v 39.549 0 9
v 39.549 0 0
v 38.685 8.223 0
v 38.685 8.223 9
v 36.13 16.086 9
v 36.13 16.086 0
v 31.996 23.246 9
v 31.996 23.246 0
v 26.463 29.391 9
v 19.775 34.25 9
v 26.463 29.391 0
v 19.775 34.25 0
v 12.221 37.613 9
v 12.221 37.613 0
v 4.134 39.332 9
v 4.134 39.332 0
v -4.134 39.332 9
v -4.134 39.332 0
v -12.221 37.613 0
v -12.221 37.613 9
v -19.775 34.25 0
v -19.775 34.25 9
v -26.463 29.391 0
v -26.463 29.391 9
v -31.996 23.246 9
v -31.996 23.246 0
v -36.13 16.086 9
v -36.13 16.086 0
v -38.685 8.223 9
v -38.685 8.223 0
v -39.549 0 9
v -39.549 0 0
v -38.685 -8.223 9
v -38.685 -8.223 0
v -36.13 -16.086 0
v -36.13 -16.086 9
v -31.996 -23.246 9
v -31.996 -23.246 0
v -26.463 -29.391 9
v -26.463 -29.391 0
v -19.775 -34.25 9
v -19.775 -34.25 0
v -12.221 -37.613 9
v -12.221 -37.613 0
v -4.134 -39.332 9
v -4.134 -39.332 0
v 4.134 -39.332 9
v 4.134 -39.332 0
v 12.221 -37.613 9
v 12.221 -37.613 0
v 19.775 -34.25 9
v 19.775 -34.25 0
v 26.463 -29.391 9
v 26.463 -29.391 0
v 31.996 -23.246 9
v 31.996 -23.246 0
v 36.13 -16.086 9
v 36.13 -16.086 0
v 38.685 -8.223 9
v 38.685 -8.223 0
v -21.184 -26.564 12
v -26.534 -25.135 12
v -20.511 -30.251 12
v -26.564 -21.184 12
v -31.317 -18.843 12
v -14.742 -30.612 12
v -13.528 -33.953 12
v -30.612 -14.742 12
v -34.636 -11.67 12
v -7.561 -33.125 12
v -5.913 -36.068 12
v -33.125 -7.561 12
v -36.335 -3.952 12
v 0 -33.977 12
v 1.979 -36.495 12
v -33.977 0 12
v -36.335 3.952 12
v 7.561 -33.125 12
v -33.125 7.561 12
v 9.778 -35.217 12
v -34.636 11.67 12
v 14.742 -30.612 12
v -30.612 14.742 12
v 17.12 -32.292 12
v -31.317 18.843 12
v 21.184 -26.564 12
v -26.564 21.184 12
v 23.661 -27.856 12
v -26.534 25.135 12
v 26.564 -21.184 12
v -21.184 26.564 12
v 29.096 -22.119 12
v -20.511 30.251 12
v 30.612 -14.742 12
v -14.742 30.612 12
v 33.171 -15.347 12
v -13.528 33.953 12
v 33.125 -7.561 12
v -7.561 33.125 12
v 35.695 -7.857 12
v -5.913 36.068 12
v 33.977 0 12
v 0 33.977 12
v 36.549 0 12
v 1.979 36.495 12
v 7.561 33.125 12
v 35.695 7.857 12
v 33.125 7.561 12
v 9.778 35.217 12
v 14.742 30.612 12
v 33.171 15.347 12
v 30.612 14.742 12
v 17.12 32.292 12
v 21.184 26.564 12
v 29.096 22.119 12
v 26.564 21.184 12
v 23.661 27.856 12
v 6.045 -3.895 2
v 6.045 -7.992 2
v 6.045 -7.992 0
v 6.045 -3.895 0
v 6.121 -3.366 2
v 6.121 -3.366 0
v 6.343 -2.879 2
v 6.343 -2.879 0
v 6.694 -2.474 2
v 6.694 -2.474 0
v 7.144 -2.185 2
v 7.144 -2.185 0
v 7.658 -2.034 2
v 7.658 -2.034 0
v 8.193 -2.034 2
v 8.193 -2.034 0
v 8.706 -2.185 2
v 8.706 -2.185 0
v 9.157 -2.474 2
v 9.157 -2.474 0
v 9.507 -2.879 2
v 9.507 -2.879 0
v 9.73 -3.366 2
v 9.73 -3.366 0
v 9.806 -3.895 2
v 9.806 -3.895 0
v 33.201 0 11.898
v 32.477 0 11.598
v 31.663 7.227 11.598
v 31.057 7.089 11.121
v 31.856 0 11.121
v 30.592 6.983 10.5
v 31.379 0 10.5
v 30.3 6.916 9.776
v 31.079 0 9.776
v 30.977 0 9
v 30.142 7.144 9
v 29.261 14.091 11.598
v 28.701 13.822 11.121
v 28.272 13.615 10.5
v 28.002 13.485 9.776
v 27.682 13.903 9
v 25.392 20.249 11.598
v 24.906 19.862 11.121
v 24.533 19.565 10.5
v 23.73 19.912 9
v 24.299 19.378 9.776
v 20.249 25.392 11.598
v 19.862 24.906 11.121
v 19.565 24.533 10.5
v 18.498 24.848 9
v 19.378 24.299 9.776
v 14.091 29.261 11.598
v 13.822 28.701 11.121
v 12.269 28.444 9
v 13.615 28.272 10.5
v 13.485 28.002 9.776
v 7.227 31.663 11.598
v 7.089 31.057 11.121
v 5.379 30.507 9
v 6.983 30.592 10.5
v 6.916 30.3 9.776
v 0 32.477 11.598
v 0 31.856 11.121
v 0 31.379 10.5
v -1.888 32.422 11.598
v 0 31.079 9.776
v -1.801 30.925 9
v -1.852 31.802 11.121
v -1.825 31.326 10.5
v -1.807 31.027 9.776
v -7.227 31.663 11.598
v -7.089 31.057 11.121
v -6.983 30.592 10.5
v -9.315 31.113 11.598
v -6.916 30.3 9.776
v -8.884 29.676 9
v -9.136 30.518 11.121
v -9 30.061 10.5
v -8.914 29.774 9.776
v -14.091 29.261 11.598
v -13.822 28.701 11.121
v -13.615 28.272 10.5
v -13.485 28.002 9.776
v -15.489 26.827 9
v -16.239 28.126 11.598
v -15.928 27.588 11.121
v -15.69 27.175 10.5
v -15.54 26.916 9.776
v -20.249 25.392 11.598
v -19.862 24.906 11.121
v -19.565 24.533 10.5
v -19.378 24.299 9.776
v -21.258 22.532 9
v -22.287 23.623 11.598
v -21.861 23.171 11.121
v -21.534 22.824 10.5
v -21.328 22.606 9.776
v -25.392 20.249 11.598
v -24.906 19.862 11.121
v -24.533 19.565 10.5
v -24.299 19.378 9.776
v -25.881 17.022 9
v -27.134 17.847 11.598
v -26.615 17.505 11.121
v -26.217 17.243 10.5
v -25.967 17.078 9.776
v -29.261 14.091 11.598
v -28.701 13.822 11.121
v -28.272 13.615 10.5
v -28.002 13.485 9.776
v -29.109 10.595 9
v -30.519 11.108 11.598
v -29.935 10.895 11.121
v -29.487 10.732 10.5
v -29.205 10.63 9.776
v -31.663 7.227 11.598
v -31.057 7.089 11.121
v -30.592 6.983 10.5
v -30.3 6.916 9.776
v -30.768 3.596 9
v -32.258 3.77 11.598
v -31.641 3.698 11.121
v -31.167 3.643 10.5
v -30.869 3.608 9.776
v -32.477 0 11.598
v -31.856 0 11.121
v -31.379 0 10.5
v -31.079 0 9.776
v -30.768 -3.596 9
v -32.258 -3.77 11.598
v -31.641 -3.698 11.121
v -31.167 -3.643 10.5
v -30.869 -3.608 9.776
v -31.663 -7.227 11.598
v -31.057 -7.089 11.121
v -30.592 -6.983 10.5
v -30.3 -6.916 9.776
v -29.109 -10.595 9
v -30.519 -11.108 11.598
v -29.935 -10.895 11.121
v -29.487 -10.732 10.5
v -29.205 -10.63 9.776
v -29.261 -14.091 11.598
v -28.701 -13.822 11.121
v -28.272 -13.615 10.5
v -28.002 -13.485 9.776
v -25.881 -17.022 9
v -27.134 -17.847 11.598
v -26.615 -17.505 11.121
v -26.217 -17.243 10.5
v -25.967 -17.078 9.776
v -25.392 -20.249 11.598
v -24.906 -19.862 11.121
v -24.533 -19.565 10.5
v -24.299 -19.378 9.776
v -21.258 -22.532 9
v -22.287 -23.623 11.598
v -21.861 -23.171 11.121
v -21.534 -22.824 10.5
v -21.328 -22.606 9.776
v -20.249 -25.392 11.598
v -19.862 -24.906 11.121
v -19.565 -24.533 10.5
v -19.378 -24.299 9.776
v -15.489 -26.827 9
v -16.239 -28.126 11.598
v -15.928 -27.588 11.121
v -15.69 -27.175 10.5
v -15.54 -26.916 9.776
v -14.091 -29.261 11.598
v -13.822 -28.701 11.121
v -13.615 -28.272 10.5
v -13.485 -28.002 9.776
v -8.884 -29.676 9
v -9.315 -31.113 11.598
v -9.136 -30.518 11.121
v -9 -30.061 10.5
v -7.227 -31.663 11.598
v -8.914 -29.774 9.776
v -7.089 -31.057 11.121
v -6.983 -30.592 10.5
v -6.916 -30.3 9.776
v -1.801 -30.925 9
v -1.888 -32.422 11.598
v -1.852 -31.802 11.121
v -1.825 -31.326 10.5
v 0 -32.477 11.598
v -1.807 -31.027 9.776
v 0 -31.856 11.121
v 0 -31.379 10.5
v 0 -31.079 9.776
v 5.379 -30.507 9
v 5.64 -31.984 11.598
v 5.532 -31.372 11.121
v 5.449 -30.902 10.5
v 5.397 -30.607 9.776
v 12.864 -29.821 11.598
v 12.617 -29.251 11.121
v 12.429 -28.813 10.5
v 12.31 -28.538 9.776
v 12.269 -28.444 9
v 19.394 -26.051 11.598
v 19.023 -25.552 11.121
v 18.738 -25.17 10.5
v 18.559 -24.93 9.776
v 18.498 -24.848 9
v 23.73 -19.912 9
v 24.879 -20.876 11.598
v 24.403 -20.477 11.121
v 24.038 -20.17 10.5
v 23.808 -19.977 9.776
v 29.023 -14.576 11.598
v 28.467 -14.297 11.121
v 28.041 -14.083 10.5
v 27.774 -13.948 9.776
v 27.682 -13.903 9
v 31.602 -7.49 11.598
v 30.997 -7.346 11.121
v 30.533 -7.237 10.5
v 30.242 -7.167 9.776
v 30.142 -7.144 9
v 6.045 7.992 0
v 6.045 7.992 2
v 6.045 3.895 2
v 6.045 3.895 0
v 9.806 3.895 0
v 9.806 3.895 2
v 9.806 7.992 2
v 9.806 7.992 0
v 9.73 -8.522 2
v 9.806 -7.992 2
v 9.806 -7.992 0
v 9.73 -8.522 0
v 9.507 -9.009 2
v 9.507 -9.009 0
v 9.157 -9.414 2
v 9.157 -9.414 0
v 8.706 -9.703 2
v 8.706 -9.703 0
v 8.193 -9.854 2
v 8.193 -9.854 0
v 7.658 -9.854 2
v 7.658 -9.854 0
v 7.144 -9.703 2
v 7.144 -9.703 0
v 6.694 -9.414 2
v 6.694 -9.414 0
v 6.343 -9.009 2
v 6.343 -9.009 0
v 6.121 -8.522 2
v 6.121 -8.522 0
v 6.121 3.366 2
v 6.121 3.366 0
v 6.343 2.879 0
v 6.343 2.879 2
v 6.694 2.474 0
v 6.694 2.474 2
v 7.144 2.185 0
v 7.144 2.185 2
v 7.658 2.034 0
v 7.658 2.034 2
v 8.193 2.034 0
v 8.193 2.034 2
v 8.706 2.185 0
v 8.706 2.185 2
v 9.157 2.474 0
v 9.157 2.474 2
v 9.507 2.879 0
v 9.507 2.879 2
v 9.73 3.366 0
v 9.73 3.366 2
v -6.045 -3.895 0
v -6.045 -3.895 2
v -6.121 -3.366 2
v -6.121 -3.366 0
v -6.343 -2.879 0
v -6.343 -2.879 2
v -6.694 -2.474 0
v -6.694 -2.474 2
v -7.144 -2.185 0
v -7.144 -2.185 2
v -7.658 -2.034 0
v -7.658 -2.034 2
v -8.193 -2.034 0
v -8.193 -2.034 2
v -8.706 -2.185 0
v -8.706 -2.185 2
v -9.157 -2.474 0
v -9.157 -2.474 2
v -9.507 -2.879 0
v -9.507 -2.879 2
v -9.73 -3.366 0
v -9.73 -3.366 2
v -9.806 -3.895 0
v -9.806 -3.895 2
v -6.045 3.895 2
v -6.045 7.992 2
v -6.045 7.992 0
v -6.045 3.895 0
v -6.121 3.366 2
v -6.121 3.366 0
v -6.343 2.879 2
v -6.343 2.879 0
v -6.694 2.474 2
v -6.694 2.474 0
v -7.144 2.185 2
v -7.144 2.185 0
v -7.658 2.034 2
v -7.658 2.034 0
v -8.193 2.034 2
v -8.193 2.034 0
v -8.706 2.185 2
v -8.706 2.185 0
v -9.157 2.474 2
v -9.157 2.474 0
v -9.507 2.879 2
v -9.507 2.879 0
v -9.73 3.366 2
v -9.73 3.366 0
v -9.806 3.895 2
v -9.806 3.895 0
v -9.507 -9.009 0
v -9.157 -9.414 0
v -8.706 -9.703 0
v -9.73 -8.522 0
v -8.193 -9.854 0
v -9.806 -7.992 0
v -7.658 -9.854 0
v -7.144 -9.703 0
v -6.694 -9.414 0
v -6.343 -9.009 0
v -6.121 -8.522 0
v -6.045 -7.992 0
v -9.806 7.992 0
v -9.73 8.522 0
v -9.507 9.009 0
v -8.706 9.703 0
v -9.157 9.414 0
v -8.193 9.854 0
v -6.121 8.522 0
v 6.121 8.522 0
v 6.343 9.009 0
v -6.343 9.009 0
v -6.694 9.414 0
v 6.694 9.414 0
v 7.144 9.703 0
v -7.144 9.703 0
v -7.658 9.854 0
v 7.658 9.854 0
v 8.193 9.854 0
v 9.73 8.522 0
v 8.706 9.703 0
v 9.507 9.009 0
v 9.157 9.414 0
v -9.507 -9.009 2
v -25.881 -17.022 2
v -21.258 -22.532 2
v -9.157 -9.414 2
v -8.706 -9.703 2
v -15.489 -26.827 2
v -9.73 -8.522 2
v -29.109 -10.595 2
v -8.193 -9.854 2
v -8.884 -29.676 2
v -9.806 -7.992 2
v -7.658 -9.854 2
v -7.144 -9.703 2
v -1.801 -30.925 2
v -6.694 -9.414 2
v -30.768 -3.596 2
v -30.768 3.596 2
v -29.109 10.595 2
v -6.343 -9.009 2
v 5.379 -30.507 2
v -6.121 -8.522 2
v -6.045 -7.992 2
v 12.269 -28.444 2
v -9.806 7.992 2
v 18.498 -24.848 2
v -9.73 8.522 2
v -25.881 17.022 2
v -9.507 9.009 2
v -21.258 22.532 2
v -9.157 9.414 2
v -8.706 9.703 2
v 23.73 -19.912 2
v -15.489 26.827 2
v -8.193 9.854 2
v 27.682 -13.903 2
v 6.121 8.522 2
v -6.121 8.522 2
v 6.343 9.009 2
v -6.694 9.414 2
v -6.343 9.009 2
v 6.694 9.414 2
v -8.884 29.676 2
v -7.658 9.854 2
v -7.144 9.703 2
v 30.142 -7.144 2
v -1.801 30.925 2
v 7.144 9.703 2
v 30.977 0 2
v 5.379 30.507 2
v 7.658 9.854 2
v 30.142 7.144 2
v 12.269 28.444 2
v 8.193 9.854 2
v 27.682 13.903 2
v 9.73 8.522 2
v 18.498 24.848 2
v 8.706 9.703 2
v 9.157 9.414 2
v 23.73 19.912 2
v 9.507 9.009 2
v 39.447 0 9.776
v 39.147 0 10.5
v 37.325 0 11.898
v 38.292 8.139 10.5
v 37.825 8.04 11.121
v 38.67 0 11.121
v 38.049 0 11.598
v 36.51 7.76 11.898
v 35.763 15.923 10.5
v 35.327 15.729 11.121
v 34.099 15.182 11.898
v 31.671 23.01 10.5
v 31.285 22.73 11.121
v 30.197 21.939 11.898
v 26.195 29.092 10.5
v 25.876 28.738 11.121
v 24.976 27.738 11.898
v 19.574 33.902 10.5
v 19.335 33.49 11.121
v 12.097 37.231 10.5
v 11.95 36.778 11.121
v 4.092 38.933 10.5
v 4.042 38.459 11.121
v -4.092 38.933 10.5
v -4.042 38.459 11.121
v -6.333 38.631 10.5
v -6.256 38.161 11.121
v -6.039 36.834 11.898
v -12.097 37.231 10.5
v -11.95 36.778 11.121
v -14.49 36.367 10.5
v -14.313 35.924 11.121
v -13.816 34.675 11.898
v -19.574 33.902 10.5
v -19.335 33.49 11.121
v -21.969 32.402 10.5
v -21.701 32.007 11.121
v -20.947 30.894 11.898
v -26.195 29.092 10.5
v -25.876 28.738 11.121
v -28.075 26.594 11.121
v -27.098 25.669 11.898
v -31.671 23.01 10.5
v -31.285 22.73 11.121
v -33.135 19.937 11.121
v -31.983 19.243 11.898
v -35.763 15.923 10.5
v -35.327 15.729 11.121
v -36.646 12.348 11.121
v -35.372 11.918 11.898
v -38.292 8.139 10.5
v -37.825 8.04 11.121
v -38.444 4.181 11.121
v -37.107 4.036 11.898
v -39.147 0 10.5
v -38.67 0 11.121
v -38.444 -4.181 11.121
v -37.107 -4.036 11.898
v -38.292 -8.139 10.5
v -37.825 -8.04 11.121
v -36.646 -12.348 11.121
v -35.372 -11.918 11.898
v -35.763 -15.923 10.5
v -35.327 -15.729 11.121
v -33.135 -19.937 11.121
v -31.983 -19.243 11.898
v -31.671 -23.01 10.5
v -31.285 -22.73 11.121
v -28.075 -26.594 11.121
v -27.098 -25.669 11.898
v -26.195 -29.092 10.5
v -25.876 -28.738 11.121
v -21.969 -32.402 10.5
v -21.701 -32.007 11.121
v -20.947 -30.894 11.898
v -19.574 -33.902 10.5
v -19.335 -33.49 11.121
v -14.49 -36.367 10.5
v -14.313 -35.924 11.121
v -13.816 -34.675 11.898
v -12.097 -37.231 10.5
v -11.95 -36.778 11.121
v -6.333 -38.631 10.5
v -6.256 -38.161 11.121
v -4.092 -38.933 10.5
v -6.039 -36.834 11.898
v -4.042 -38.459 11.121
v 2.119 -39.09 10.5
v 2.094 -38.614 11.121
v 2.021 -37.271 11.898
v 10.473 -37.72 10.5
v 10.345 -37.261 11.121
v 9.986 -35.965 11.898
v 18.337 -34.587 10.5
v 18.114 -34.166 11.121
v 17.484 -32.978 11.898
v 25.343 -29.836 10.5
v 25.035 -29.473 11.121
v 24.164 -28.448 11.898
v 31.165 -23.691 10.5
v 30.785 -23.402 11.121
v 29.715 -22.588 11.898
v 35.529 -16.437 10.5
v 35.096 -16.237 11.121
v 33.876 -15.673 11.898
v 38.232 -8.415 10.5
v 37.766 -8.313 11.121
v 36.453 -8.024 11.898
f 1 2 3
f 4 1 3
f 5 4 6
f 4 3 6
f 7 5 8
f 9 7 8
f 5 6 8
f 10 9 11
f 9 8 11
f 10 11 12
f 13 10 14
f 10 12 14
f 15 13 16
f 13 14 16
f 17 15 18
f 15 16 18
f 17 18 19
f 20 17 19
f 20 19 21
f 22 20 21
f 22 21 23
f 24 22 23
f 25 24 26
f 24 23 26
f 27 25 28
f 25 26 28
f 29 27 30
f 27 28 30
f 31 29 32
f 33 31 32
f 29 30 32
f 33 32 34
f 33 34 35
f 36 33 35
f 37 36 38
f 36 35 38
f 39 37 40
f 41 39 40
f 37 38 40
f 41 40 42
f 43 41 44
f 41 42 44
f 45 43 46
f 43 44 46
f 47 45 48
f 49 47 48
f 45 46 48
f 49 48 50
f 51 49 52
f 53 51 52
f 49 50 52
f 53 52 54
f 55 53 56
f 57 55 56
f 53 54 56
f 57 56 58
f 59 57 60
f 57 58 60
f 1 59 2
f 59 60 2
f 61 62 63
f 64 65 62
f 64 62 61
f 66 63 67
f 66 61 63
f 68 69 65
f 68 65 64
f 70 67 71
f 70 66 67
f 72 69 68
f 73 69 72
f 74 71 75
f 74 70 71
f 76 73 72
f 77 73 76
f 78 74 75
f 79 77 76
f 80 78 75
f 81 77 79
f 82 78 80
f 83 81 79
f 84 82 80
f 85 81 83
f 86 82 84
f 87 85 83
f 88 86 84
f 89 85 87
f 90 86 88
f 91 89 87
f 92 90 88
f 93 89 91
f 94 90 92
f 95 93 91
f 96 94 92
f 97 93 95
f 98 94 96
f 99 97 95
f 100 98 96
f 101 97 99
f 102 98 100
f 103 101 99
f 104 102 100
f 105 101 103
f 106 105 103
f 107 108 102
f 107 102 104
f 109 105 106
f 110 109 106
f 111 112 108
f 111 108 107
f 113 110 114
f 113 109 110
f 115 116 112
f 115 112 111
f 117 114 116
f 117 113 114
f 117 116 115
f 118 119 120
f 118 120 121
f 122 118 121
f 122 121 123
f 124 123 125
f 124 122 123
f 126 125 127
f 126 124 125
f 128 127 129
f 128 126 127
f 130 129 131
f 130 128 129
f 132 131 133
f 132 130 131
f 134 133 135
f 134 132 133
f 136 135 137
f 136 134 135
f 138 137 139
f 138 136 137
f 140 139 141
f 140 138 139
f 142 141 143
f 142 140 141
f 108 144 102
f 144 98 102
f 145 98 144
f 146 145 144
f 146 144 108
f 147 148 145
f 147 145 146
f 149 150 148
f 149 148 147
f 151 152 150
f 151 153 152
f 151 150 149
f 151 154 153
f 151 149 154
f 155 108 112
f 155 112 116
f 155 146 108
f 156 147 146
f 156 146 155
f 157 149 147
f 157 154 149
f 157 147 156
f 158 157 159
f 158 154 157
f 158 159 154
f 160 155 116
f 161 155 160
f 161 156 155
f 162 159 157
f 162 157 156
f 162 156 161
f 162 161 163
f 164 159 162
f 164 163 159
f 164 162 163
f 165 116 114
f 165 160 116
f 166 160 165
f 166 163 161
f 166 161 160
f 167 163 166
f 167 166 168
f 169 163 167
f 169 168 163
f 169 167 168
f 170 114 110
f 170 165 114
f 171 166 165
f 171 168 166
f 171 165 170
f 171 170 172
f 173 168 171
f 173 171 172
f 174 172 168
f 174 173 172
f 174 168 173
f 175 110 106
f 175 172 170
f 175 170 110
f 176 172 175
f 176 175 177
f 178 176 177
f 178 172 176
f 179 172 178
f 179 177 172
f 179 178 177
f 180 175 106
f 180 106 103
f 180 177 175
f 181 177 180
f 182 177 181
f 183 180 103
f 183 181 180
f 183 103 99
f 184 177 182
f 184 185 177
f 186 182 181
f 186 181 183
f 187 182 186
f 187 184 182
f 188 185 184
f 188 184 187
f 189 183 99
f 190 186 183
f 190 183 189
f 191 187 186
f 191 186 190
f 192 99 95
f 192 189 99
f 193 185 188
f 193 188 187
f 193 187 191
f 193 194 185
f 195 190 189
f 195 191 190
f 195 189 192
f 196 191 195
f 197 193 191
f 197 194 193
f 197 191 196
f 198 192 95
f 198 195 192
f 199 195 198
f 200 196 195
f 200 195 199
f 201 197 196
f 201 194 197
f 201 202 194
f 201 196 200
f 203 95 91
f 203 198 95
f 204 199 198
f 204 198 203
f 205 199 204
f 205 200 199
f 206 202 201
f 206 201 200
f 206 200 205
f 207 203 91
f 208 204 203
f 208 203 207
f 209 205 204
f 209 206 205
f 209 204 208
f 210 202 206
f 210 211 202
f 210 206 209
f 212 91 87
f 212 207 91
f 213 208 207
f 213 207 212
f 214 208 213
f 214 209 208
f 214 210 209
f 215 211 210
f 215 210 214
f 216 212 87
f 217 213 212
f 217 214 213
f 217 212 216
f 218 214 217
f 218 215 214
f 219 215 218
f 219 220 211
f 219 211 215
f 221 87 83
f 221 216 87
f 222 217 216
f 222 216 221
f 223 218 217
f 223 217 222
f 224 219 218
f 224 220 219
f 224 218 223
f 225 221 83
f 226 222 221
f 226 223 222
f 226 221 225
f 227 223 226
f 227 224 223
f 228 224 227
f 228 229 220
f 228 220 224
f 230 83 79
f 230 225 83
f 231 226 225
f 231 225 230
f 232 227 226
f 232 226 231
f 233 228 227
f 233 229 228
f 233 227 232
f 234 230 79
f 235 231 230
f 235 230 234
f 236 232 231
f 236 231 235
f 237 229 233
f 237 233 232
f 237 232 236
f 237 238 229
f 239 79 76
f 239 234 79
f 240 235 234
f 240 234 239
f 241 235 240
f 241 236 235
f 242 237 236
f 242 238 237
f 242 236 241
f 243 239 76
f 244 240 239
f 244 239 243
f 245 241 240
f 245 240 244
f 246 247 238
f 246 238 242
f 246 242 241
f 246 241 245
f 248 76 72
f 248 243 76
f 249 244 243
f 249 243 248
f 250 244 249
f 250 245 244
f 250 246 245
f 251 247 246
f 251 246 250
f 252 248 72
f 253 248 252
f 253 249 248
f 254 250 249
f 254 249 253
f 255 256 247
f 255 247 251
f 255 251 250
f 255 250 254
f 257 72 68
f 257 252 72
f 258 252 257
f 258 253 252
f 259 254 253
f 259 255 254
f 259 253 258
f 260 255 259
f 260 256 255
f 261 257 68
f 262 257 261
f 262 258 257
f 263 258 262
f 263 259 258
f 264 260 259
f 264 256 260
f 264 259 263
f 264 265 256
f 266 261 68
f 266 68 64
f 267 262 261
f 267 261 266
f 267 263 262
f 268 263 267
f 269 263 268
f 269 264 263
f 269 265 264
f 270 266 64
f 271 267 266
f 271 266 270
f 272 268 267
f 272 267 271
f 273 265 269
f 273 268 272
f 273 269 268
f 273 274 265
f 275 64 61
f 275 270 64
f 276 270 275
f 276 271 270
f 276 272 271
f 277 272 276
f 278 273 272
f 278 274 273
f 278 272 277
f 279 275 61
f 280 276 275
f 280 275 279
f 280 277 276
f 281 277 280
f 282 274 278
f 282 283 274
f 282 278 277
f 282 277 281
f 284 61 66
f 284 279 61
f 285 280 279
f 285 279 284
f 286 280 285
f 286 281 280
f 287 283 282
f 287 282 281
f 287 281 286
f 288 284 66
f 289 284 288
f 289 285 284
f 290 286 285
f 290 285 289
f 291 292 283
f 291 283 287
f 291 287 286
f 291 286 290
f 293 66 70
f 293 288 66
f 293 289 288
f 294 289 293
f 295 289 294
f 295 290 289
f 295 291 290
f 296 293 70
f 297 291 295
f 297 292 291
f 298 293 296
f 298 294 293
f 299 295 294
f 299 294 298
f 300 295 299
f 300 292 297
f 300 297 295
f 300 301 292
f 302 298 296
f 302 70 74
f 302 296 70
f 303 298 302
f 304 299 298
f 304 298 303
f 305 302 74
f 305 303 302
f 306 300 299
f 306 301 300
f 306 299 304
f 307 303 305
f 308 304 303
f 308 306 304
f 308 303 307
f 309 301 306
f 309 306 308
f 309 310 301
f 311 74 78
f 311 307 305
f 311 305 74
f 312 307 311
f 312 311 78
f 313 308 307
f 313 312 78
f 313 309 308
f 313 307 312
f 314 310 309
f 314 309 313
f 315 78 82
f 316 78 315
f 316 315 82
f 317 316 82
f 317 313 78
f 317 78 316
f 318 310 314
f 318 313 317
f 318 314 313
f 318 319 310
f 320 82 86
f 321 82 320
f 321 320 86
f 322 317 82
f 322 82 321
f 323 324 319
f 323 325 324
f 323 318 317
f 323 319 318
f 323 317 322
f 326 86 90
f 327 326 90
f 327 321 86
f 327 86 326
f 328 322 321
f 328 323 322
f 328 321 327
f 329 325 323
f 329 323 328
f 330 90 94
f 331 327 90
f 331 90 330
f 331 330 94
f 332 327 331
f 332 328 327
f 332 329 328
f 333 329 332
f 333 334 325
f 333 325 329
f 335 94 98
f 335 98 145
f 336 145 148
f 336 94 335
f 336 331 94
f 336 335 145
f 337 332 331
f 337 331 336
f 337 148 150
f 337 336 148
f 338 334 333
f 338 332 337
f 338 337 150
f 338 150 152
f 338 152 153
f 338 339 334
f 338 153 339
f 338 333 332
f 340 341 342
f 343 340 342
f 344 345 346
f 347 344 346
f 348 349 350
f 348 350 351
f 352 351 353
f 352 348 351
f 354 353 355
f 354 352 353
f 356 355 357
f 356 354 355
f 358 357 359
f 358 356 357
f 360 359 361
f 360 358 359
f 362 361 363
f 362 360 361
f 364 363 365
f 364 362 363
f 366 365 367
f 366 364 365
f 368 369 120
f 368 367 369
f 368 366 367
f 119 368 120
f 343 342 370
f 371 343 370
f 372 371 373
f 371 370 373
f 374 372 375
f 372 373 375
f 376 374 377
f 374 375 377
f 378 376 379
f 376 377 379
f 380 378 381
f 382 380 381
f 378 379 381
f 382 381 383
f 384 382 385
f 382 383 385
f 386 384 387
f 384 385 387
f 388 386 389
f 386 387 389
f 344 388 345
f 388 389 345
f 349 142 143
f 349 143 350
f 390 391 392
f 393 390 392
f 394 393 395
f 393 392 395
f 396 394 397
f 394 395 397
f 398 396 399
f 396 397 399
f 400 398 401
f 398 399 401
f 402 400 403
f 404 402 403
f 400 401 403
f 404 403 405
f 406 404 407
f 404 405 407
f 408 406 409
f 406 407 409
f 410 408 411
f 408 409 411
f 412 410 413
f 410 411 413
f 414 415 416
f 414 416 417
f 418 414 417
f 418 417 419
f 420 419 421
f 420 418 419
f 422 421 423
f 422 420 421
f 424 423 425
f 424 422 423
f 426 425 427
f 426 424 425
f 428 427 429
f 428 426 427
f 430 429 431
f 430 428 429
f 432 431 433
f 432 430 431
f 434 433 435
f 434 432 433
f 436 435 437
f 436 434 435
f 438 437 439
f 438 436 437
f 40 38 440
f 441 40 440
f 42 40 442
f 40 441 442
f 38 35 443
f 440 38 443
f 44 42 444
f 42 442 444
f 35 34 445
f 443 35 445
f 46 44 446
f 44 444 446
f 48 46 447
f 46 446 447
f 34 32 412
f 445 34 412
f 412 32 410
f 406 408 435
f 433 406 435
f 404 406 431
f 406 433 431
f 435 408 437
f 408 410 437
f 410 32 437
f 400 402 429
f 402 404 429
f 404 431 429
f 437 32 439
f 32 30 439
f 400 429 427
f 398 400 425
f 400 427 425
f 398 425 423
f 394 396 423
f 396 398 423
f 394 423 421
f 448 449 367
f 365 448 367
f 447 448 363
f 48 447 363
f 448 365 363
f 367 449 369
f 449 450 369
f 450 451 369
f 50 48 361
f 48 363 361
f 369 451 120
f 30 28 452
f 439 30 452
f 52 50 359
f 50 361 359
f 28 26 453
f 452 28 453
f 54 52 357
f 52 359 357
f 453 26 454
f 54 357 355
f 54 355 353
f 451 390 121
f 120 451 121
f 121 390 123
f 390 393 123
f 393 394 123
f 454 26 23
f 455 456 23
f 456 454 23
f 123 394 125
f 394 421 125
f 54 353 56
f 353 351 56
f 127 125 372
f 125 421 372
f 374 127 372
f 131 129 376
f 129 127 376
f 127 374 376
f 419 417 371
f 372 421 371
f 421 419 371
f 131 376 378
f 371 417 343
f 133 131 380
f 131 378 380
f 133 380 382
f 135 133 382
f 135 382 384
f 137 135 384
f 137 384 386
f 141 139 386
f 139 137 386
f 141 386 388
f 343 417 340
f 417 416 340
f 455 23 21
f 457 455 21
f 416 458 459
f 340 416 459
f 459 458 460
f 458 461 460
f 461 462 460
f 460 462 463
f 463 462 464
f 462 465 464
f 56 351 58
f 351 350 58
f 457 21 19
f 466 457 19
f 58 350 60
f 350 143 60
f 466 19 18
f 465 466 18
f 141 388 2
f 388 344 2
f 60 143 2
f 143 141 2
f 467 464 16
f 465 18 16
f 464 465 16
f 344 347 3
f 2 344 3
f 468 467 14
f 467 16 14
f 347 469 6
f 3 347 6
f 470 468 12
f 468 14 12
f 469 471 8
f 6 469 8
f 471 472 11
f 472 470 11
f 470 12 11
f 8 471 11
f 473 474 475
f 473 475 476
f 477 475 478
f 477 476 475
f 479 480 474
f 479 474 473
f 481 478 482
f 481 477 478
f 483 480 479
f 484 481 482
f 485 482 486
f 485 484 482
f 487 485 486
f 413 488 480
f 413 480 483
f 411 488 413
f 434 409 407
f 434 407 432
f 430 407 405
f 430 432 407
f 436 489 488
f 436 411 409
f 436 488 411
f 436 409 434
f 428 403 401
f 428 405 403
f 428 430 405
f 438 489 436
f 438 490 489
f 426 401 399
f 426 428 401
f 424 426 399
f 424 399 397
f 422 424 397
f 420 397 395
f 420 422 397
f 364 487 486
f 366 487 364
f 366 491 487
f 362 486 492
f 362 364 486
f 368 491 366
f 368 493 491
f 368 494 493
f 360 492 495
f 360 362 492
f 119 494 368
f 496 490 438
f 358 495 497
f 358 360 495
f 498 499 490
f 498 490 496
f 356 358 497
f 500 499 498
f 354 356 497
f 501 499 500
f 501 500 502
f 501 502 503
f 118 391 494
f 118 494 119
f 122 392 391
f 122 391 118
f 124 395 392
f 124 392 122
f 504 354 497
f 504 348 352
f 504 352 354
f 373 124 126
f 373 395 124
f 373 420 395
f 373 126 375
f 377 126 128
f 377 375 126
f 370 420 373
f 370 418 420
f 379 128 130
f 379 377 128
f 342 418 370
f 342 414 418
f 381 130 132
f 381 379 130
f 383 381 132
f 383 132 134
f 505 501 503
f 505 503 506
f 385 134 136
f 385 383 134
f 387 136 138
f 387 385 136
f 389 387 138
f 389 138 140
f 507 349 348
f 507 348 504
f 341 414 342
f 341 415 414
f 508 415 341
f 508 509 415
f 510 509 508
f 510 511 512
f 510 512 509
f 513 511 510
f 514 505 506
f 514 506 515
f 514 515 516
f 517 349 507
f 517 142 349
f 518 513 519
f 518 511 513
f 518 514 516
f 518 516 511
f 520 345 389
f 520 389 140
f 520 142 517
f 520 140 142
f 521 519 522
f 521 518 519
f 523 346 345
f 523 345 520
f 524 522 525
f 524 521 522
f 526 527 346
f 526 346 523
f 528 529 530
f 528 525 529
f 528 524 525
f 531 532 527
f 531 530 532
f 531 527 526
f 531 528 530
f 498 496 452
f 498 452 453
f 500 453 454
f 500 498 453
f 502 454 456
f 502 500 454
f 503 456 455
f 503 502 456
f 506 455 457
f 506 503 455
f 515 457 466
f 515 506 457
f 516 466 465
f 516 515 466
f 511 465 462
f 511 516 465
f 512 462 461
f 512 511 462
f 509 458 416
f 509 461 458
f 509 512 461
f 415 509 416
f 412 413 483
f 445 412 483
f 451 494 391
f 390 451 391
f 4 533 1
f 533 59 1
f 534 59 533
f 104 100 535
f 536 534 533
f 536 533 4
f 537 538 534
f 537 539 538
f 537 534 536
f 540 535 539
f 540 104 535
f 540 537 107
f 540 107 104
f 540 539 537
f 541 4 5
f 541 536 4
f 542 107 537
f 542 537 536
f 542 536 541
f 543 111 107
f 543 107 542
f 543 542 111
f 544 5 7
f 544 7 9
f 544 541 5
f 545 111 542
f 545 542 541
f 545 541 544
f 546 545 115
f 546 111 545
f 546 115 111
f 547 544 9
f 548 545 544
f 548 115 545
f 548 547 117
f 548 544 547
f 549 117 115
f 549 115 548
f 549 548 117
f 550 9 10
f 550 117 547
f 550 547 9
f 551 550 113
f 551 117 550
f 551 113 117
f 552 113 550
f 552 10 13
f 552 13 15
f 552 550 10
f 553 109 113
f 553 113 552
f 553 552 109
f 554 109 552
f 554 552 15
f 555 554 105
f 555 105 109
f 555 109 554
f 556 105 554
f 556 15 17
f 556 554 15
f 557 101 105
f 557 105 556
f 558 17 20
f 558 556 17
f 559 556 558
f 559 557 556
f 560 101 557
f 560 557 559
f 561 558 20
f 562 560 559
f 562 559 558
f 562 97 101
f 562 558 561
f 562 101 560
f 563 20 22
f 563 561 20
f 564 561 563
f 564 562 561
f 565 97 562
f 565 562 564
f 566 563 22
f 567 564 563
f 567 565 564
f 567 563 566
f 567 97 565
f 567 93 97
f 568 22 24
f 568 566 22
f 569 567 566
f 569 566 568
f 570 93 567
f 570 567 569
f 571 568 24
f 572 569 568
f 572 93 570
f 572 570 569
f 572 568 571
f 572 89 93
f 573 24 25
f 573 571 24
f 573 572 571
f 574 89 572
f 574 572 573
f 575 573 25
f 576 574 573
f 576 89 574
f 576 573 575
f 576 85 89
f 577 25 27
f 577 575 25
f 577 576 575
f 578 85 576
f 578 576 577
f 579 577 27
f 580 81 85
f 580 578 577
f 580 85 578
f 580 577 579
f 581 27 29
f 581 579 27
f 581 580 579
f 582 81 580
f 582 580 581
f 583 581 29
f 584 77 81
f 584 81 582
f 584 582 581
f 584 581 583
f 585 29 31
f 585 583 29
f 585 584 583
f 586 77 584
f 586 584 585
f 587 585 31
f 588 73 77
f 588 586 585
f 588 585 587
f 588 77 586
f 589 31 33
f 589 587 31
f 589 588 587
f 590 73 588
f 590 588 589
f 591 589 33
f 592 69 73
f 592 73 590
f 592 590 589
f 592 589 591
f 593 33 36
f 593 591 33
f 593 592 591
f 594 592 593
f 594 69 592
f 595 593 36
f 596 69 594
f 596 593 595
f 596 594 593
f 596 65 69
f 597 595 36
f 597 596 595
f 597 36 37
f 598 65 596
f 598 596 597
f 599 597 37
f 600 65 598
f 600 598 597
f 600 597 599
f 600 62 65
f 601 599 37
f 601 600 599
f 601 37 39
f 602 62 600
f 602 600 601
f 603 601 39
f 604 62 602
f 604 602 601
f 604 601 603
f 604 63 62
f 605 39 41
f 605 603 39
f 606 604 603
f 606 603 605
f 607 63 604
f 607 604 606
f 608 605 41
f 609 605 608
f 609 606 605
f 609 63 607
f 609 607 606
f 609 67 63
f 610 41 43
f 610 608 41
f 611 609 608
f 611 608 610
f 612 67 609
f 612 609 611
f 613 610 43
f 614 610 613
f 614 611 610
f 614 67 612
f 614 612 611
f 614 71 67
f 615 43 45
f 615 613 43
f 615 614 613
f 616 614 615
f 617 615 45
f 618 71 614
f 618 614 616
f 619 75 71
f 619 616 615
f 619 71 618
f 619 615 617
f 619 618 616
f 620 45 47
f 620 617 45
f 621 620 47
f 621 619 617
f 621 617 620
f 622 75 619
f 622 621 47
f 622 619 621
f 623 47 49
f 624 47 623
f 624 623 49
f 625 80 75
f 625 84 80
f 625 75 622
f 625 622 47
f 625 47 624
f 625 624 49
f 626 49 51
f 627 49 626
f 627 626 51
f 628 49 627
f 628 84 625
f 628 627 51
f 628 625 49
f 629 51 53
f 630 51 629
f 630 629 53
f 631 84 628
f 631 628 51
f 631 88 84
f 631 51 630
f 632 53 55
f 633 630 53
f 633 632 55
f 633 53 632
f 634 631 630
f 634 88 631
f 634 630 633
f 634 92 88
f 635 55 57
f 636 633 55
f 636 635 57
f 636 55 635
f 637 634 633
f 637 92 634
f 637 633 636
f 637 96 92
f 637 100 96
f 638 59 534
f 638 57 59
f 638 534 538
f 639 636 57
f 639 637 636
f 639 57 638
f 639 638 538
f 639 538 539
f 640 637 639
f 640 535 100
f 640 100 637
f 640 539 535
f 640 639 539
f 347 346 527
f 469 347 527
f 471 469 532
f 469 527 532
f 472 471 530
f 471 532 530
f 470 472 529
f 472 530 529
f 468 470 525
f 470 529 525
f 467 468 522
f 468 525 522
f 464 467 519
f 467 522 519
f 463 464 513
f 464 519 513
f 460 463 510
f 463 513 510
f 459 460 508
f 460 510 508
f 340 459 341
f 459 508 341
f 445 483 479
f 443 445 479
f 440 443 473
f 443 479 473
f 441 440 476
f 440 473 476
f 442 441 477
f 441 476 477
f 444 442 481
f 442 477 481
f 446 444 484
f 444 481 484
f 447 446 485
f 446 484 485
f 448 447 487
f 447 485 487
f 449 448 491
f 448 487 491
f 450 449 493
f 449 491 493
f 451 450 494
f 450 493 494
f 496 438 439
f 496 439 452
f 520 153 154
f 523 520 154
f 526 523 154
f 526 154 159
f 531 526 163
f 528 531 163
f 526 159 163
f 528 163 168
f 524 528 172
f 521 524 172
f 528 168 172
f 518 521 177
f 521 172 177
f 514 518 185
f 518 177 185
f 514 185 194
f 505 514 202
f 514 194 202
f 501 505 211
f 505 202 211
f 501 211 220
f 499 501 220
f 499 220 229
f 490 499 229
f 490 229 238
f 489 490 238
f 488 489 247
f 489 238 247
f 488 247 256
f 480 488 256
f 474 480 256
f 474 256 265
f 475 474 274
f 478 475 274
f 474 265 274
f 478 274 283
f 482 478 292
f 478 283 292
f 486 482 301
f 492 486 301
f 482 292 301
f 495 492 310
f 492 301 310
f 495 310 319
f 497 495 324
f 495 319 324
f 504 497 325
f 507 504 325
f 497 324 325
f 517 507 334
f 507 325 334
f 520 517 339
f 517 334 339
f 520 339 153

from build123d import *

# Parameters (mm, degrees)
BOSS_EXTRUDE1_OUTLINE_R = 39.549034963
BOSS_EXTRUDE1_DEPTH     = 12
SKETCH2_R               = 30.977240476
CUT_EXTRUDE1_DEPTH      = 10
FILLET1_R               = 3
FILLET3_R               = 3
CUT_EXTRUDE2_DEPTH      = 10


# Read off the part's stored shape, not the designer's step: Boss-Extrude1
with BuildPart() as part:
    # Boss-Extrude1 outline → Boss-Extrude1 (new body)
    with BuildSketch(Plane.XY):
        Circle(BOSS_EXTRUDE1_OUTLINE_R)
    extrude(amount=BOSS_EXTRUDE1_DEPTH)

    # Sketch2 → Cut-Extrude1 (cut)
    with BuildSketch(Plane.XY.offset(12)):
        Circle(SKETCH2_R)
    extrude(amount=-CUT_EXTRUDE1_DEPTH, mode=Mode.SUBTRACT)

    # Fillet1
    fillet1_edges = [part.edges().sort_by_distance(p)[0] for p in [
        (-39.549034963, 0, 12),
    ]]
    fillet(fillet1_edges, radius=FILLET1_R)

    # Fillet3
    fillet3_edges = [part.edges().sort_by_distance(p)[0] for p in [
        (-30.977240476, 0, 12),
    ]]
    fillet(fillet3_edges, radius=FILLET3_R)

    # Sketch3 → Cut-Extrude2 (cut)
    with BuildSketch(Plane.XY.offset(2)):
        with BuildLine():
            Line((-6.044621496, 7.992332867), (-6.044621496, 3.895422742))
            ThreePointArc((-6.044621496, 3.895422742), (-7.925170406, 2.014873832), (-9.805719315, 3.895422742))
            Line((-9.805719315, 3.895422742), (-9.805719315, 7.992332867))
            ThreePointArc((-9.805719315, 7.992332867), (-7.925170406, 9.872881776), (-6.044621496, 7.992332867))
        make_face()
        with BuildLine():
            Line((6.044621496, 7.992332867), (6.044621496, 3.895422742))
            ThreePointArc((6.044621496, 3.895422742), (7.925170406, 2.014873832), (9.805719315, 3.895422742))
            Line((9.805719315, 3.895422742), (9.805719315, 7.992332867))
            ThreePointArc((9.805719315, 7.992332867), (7.925170406, 9.872881776), (6.044621496, 7.992332867))
        make_face()
        with BuildLine():
            Line((6.044621496, -7.992332867), (6.044621496, -3.895422742))
            ThreePointArc((6.044621496, -3.895422742), (7.925170406, -2.014873832), (9.805719315, -3.895422742))
            Line((9.805719315, -3.895422742), (9.805719315, -7.992332867))
            ThreePointArc((9.805719315, -7.992332867), (7.925170406, -9.872881776), (6.044621496, -7.992332867))
        make_face()
        with BuildLine():
            Line((-6.044621496, -7.992332867), (-6.044621496, -3.895422742))
            ThreePointArc((-6.044621496, -3.895422742), (-7.925170406, -2.014873832), (-9.805719315, -3.895422742))
            Line((-9.805719315, -3.895422742), (-9.805719315, -7.992332867))
            ThreePointArc((-9.805719315, -7.992332867), (-7.925170406, -9.872881776), (-6.044621496, -7.992332867))
        make_face()
    extrude(amount=-CUT_EXTRUDE2_DEPTH, mode=Mode.SUBTRACT)


solid = part.part
